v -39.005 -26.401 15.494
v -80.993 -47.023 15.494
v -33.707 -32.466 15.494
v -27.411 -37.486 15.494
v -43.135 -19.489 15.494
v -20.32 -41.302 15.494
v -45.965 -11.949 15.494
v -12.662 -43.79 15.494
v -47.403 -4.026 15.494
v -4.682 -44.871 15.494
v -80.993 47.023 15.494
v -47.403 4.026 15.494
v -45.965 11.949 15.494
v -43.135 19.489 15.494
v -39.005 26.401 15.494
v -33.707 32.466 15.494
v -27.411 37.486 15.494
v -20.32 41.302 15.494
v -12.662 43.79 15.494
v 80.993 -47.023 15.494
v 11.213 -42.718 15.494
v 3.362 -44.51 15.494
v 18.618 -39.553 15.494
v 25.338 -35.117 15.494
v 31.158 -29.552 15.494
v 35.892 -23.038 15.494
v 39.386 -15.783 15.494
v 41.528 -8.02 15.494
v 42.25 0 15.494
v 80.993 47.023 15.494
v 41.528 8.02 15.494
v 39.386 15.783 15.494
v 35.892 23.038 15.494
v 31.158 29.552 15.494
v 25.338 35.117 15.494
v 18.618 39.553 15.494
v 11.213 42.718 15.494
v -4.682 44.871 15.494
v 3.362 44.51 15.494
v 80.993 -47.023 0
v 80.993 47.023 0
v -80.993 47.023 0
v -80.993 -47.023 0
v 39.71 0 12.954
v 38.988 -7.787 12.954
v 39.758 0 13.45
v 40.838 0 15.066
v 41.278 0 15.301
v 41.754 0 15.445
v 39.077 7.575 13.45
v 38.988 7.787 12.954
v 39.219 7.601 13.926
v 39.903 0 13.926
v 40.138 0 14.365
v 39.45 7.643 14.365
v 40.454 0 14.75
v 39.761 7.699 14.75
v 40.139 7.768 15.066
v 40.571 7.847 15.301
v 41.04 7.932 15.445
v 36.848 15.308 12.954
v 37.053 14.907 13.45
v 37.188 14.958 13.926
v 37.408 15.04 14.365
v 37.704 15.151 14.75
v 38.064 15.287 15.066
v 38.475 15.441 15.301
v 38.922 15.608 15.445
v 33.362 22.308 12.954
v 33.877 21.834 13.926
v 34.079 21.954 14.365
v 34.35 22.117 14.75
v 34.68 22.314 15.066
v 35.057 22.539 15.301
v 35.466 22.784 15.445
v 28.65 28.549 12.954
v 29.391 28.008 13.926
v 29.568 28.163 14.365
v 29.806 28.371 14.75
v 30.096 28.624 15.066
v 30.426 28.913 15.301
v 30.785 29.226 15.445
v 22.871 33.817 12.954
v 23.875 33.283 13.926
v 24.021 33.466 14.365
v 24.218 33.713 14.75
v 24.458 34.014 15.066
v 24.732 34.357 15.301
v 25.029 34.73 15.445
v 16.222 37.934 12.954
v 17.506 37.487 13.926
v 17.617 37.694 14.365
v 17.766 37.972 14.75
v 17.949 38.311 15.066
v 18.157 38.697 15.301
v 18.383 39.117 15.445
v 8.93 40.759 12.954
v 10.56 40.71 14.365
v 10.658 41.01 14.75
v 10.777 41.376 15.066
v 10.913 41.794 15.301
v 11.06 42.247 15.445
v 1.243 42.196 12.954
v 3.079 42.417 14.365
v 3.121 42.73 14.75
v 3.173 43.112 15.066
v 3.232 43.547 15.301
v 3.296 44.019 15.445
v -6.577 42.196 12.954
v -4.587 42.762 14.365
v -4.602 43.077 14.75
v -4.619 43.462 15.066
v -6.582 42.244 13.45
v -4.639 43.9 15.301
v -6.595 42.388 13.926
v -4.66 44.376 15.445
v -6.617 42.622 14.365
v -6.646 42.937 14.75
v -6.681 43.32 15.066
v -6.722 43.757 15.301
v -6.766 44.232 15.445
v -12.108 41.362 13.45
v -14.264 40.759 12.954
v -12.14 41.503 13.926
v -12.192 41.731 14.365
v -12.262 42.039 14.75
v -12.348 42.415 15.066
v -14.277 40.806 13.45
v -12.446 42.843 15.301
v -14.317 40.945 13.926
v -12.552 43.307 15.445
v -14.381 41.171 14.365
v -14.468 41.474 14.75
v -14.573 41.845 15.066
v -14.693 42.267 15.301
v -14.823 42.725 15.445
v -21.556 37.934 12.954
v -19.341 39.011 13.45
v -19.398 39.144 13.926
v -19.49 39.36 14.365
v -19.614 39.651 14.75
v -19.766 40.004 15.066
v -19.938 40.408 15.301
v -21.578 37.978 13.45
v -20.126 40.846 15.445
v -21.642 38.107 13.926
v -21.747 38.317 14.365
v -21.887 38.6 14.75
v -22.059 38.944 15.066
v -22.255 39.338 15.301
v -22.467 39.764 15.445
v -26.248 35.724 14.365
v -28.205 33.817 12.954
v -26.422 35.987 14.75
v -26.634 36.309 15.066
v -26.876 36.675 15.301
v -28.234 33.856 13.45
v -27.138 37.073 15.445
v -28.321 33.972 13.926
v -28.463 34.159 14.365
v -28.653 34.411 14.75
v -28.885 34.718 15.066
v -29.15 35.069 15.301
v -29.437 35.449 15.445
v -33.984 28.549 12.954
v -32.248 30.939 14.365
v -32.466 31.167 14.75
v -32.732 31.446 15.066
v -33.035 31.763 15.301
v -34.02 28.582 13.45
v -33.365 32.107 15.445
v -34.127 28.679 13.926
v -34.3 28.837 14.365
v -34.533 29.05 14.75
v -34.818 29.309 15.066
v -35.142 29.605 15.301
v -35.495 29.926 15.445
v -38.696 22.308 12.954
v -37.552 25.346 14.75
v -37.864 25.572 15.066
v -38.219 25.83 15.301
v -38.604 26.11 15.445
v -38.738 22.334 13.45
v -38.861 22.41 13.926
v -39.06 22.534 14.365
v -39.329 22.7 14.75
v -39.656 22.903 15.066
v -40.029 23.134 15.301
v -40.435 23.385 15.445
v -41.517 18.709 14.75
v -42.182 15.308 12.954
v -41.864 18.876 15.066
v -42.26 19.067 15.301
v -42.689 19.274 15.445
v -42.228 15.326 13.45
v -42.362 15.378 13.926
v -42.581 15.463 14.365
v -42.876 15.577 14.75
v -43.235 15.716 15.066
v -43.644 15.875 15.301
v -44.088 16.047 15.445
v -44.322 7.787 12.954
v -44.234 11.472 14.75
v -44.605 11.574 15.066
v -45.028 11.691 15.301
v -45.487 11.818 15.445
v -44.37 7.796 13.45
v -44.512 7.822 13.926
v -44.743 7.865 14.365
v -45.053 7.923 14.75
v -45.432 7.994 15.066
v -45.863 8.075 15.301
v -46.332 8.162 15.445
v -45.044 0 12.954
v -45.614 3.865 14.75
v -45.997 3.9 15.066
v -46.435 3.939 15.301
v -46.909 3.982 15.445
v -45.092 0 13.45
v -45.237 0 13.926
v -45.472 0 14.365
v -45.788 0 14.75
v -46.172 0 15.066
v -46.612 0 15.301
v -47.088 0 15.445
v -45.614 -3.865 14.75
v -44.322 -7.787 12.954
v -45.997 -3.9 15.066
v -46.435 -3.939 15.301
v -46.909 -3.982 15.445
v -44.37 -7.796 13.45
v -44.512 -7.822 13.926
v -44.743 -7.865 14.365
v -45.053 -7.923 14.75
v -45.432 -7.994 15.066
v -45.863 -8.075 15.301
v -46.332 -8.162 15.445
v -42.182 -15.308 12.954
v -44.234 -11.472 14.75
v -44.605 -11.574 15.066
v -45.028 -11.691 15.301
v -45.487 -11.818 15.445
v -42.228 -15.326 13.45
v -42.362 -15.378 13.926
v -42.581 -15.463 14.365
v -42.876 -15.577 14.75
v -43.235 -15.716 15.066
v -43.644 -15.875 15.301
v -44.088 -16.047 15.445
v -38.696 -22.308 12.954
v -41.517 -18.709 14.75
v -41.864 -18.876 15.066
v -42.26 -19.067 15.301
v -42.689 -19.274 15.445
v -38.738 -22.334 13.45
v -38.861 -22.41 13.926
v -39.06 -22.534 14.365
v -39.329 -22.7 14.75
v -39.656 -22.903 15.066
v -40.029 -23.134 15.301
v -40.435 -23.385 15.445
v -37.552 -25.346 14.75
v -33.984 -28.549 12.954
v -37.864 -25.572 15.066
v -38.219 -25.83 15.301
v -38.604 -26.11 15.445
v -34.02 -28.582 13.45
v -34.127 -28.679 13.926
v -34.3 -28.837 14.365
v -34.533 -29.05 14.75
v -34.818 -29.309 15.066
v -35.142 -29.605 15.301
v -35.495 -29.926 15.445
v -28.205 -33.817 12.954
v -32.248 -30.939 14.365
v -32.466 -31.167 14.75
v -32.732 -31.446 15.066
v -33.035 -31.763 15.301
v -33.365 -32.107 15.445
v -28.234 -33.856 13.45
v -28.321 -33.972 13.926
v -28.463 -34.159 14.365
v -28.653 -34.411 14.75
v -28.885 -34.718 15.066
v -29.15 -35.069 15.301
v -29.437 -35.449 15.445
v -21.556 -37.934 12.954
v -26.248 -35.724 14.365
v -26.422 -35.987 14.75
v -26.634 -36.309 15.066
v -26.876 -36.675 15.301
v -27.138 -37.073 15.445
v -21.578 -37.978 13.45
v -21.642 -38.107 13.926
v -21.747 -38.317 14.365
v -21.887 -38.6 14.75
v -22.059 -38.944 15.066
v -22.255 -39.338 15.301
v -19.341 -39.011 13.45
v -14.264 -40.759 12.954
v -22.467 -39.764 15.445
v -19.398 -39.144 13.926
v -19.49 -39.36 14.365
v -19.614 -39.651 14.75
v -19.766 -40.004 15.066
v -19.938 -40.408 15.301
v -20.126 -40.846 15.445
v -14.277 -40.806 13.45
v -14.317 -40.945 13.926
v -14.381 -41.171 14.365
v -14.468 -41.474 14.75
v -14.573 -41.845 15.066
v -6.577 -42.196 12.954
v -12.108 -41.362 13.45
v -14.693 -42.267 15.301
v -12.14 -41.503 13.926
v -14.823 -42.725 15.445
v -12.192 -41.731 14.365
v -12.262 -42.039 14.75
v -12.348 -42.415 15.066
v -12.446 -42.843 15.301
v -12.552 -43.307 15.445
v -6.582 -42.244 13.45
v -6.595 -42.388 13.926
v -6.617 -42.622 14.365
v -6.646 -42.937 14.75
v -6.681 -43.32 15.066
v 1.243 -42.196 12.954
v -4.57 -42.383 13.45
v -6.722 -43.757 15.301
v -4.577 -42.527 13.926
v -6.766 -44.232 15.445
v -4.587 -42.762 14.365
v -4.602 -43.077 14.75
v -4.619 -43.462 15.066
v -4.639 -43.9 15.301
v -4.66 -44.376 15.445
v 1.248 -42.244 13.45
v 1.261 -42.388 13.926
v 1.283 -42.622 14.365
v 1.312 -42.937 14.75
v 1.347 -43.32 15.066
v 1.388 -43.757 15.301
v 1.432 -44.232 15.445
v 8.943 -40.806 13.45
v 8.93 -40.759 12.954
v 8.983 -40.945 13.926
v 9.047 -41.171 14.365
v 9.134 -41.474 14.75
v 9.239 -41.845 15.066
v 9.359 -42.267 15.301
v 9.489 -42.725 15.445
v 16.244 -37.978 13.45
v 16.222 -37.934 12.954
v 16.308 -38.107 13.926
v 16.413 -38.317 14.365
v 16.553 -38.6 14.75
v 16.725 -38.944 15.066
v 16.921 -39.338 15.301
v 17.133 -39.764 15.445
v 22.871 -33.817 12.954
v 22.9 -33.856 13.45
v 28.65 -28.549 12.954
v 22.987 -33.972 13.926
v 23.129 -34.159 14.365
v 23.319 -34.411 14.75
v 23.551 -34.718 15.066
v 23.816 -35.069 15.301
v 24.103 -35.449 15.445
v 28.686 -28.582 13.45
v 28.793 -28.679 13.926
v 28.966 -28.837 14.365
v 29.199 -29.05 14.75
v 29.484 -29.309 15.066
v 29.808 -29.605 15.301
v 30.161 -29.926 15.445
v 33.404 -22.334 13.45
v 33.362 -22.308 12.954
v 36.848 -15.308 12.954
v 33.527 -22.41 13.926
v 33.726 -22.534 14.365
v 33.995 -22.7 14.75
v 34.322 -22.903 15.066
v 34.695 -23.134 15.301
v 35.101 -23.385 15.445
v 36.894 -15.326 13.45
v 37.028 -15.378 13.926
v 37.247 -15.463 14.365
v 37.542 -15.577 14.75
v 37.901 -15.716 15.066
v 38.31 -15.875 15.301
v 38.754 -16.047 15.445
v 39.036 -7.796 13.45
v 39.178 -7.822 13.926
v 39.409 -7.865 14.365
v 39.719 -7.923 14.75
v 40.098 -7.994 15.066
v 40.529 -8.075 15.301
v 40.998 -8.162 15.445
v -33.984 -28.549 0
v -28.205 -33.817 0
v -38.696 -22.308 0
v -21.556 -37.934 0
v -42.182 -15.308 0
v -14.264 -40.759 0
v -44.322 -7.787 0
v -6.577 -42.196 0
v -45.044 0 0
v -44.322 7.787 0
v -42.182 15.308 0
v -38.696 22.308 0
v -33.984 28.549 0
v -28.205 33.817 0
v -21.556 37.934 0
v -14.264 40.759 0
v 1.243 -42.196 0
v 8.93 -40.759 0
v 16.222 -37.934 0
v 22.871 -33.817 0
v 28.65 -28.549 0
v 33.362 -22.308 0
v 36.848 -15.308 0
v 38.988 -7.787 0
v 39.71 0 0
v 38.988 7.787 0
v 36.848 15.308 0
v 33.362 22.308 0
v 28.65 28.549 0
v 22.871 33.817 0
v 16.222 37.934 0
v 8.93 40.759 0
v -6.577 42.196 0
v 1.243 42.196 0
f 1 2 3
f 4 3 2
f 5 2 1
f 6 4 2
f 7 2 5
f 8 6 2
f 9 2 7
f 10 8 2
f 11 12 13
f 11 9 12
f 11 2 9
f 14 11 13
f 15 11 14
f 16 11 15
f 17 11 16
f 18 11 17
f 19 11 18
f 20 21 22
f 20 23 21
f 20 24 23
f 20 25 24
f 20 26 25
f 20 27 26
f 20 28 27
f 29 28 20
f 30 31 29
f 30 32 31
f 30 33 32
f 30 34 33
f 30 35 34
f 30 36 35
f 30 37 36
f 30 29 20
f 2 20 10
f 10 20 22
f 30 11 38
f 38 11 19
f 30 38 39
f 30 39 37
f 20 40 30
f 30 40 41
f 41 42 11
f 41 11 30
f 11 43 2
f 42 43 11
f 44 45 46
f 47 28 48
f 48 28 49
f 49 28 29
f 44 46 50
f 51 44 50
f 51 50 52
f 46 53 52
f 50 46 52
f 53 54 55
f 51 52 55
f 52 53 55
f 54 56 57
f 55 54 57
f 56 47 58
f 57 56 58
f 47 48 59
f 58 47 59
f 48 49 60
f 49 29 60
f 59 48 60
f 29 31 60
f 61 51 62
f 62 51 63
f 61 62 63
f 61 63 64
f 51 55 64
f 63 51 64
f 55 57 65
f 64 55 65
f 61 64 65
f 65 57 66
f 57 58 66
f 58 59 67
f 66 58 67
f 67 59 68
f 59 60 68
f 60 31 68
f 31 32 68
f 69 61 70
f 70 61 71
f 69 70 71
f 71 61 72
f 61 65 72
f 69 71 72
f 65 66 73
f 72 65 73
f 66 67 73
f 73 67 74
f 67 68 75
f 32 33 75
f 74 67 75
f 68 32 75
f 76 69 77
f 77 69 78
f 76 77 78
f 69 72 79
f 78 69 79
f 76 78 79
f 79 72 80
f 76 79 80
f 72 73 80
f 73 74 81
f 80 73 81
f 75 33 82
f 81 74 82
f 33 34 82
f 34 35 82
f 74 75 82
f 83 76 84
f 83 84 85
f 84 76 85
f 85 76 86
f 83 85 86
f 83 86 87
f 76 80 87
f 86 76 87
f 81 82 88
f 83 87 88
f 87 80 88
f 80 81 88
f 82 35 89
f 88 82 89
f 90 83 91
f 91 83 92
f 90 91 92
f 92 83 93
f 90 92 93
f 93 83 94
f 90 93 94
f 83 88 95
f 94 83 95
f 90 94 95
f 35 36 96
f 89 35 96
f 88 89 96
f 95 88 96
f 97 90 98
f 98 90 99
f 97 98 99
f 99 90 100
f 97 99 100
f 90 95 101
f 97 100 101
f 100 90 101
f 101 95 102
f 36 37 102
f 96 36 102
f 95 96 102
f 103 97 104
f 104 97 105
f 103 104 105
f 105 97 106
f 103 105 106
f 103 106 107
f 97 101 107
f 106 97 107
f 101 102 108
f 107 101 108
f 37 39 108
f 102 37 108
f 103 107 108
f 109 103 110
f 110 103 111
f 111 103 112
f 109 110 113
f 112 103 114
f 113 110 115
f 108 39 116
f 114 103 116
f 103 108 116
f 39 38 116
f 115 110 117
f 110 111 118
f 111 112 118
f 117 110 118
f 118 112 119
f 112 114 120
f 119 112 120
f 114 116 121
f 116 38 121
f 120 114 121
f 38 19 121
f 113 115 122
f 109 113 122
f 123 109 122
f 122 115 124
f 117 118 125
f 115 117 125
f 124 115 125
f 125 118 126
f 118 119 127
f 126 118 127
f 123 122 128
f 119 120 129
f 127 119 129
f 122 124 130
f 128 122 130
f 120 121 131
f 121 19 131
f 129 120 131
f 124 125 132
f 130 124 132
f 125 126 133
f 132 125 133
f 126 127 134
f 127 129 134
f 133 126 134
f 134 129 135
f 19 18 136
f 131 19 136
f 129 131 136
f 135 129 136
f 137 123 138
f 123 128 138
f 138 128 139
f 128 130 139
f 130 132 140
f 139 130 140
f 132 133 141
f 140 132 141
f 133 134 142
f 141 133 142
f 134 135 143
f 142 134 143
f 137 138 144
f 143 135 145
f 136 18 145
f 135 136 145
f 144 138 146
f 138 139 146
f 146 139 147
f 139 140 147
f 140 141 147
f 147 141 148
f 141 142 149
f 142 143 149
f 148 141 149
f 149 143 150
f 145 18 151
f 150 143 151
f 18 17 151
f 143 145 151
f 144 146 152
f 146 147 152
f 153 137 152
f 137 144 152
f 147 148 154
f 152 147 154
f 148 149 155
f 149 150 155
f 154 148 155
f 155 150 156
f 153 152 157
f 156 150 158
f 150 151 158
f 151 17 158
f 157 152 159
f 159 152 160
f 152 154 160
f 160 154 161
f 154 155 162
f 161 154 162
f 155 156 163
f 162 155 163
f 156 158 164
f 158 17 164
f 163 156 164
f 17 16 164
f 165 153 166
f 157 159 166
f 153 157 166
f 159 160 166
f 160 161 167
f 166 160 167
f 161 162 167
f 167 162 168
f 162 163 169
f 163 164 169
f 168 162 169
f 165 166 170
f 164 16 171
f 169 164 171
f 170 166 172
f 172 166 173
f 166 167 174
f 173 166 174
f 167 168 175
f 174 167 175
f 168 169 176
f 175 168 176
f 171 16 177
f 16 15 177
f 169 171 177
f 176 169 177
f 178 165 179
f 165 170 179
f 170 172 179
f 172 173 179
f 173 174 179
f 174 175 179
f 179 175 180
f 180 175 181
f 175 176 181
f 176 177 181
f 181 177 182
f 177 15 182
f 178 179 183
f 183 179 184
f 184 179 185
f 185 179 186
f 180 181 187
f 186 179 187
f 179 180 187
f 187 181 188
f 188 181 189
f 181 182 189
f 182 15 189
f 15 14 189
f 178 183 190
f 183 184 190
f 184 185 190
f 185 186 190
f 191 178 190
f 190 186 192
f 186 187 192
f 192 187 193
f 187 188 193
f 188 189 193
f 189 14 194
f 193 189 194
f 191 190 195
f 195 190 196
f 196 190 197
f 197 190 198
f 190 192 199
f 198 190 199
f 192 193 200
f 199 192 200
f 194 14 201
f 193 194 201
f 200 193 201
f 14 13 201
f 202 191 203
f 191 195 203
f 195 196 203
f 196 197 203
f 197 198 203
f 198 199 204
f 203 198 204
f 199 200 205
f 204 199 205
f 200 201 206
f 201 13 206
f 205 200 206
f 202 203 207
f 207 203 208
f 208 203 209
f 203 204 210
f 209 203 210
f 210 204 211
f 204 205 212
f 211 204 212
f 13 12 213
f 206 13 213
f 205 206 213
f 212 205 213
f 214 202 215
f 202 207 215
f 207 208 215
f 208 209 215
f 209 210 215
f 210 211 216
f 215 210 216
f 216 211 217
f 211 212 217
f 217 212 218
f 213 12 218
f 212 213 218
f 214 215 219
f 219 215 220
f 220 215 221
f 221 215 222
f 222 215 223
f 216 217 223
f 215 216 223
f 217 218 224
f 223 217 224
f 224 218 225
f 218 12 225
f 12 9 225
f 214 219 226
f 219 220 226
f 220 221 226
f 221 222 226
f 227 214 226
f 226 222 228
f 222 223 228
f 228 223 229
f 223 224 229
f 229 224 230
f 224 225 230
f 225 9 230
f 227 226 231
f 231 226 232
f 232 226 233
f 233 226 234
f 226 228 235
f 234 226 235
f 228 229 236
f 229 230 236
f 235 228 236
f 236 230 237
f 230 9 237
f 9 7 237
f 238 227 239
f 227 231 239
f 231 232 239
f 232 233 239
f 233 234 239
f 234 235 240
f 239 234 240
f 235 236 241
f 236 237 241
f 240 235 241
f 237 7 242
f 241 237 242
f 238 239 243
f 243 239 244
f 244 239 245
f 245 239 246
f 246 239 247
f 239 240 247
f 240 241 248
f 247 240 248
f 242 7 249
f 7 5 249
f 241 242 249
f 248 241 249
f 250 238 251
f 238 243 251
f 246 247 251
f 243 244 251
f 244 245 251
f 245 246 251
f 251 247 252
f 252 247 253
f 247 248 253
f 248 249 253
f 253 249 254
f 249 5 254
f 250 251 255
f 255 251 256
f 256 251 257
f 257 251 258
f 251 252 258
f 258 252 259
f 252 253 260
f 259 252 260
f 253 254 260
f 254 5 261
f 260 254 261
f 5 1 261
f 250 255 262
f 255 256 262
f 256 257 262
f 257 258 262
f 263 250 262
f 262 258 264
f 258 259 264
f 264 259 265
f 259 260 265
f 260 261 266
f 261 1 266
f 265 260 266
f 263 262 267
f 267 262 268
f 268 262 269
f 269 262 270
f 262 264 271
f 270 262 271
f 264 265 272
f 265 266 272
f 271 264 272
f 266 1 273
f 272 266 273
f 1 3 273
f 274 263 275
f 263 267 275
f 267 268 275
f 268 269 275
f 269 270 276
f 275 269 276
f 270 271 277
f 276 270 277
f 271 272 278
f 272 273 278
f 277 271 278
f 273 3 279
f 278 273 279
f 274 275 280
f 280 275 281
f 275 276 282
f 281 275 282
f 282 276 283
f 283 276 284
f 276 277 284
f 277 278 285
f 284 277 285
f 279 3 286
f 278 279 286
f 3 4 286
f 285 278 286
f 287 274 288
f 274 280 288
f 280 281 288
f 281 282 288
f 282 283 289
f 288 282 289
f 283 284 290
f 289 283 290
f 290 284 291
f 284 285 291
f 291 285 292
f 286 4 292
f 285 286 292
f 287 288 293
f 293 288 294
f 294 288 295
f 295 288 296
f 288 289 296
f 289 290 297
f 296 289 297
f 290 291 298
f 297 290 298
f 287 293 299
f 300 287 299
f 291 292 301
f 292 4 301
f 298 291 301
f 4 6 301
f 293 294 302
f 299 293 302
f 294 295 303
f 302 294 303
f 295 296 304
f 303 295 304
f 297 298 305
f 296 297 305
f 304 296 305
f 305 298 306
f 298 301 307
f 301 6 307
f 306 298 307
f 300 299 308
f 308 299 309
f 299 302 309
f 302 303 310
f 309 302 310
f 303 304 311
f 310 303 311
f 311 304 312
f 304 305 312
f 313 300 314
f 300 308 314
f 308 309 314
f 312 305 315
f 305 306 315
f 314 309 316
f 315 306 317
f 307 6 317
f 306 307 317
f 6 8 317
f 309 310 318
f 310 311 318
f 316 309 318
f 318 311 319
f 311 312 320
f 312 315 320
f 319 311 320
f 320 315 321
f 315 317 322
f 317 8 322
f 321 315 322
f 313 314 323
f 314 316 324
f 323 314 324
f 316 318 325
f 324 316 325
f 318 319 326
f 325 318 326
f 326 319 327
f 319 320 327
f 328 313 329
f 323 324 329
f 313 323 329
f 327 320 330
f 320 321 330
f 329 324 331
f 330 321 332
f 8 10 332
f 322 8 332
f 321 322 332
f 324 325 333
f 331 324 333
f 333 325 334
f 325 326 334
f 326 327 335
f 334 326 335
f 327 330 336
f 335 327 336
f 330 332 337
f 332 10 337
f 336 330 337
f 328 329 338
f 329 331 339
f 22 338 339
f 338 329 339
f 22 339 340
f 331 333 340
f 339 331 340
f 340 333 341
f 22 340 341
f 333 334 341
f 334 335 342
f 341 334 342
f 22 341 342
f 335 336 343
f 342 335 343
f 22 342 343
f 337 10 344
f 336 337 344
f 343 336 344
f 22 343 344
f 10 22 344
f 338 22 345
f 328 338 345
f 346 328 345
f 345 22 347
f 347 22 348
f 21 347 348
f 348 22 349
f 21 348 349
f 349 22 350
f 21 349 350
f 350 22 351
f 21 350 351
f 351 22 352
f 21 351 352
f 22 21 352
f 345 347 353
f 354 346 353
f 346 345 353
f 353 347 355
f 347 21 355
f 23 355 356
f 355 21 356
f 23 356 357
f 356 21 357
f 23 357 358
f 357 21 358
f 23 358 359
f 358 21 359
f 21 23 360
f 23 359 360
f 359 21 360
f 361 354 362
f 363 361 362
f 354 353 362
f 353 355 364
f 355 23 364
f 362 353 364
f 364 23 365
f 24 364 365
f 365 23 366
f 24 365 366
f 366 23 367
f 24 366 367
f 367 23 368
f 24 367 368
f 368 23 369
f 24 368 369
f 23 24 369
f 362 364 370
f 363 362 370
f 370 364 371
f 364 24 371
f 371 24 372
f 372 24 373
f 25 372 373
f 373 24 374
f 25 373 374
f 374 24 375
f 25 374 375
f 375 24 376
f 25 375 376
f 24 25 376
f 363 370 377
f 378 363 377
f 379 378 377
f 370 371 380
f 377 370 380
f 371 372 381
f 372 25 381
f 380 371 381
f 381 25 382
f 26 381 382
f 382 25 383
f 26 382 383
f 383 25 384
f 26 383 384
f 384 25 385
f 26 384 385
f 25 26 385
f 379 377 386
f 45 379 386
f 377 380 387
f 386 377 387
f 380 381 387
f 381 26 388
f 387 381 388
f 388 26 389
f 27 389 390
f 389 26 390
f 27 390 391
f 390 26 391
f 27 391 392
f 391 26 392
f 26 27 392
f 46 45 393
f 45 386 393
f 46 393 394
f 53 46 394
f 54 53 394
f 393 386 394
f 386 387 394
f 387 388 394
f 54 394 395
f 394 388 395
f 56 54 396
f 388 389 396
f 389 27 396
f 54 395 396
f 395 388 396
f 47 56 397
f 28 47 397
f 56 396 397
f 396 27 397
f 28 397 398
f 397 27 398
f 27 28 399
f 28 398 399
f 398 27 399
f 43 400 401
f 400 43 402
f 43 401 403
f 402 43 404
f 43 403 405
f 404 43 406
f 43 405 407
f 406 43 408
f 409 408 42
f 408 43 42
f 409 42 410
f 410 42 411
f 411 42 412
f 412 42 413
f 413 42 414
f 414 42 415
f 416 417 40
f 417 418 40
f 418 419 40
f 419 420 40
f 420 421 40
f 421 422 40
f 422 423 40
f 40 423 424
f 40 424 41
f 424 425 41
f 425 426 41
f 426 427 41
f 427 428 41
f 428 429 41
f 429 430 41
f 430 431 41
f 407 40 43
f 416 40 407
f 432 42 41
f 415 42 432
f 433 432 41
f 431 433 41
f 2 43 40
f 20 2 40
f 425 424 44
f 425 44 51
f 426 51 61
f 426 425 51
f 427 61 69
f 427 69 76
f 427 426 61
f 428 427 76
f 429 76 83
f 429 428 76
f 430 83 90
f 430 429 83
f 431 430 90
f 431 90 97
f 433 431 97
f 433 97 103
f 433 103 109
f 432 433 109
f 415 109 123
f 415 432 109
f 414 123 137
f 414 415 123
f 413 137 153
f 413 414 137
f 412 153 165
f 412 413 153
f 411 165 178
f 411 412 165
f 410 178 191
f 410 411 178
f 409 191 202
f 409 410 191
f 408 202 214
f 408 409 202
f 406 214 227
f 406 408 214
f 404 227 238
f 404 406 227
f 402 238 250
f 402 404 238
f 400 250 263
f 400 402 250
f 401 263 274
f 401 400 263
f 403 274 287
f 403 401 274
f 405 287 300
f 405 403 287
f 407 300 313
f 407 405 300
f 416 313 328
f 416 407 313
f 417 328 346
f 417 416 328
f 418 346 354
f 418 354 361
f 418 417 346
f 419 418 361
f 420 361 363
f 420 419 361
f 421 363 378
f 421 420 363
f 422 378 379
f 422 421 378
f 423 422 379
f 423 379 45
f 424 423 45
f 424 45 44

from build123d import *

# Parameters (mm, degrees)
F0_W     = 161.985158
F0_H     = 94.046846
F0_R     = 42.376618
F1_DEPTH = 15.494
F2_R     = 2.54


with BuildPart() as f1:
    # F0 (on Top) → F1 (new body)
    with BuildSketch(Plane.XY):
        Rectangle(F0_W, F0_H)
        with Locations((-2.667, 0)):
            Circle(F0_R, mode=Mode.SUBTRACT)
    extrude(amount=F1_DEPTH)

    # F2
    f2_edges = [f1.edges().sort_by_distance(p)[0] for p in [
        (-45.043619, 0, 15.494),
    ]]
    fillet(f2_edges, radius=F2_R)


solid = f1.part
